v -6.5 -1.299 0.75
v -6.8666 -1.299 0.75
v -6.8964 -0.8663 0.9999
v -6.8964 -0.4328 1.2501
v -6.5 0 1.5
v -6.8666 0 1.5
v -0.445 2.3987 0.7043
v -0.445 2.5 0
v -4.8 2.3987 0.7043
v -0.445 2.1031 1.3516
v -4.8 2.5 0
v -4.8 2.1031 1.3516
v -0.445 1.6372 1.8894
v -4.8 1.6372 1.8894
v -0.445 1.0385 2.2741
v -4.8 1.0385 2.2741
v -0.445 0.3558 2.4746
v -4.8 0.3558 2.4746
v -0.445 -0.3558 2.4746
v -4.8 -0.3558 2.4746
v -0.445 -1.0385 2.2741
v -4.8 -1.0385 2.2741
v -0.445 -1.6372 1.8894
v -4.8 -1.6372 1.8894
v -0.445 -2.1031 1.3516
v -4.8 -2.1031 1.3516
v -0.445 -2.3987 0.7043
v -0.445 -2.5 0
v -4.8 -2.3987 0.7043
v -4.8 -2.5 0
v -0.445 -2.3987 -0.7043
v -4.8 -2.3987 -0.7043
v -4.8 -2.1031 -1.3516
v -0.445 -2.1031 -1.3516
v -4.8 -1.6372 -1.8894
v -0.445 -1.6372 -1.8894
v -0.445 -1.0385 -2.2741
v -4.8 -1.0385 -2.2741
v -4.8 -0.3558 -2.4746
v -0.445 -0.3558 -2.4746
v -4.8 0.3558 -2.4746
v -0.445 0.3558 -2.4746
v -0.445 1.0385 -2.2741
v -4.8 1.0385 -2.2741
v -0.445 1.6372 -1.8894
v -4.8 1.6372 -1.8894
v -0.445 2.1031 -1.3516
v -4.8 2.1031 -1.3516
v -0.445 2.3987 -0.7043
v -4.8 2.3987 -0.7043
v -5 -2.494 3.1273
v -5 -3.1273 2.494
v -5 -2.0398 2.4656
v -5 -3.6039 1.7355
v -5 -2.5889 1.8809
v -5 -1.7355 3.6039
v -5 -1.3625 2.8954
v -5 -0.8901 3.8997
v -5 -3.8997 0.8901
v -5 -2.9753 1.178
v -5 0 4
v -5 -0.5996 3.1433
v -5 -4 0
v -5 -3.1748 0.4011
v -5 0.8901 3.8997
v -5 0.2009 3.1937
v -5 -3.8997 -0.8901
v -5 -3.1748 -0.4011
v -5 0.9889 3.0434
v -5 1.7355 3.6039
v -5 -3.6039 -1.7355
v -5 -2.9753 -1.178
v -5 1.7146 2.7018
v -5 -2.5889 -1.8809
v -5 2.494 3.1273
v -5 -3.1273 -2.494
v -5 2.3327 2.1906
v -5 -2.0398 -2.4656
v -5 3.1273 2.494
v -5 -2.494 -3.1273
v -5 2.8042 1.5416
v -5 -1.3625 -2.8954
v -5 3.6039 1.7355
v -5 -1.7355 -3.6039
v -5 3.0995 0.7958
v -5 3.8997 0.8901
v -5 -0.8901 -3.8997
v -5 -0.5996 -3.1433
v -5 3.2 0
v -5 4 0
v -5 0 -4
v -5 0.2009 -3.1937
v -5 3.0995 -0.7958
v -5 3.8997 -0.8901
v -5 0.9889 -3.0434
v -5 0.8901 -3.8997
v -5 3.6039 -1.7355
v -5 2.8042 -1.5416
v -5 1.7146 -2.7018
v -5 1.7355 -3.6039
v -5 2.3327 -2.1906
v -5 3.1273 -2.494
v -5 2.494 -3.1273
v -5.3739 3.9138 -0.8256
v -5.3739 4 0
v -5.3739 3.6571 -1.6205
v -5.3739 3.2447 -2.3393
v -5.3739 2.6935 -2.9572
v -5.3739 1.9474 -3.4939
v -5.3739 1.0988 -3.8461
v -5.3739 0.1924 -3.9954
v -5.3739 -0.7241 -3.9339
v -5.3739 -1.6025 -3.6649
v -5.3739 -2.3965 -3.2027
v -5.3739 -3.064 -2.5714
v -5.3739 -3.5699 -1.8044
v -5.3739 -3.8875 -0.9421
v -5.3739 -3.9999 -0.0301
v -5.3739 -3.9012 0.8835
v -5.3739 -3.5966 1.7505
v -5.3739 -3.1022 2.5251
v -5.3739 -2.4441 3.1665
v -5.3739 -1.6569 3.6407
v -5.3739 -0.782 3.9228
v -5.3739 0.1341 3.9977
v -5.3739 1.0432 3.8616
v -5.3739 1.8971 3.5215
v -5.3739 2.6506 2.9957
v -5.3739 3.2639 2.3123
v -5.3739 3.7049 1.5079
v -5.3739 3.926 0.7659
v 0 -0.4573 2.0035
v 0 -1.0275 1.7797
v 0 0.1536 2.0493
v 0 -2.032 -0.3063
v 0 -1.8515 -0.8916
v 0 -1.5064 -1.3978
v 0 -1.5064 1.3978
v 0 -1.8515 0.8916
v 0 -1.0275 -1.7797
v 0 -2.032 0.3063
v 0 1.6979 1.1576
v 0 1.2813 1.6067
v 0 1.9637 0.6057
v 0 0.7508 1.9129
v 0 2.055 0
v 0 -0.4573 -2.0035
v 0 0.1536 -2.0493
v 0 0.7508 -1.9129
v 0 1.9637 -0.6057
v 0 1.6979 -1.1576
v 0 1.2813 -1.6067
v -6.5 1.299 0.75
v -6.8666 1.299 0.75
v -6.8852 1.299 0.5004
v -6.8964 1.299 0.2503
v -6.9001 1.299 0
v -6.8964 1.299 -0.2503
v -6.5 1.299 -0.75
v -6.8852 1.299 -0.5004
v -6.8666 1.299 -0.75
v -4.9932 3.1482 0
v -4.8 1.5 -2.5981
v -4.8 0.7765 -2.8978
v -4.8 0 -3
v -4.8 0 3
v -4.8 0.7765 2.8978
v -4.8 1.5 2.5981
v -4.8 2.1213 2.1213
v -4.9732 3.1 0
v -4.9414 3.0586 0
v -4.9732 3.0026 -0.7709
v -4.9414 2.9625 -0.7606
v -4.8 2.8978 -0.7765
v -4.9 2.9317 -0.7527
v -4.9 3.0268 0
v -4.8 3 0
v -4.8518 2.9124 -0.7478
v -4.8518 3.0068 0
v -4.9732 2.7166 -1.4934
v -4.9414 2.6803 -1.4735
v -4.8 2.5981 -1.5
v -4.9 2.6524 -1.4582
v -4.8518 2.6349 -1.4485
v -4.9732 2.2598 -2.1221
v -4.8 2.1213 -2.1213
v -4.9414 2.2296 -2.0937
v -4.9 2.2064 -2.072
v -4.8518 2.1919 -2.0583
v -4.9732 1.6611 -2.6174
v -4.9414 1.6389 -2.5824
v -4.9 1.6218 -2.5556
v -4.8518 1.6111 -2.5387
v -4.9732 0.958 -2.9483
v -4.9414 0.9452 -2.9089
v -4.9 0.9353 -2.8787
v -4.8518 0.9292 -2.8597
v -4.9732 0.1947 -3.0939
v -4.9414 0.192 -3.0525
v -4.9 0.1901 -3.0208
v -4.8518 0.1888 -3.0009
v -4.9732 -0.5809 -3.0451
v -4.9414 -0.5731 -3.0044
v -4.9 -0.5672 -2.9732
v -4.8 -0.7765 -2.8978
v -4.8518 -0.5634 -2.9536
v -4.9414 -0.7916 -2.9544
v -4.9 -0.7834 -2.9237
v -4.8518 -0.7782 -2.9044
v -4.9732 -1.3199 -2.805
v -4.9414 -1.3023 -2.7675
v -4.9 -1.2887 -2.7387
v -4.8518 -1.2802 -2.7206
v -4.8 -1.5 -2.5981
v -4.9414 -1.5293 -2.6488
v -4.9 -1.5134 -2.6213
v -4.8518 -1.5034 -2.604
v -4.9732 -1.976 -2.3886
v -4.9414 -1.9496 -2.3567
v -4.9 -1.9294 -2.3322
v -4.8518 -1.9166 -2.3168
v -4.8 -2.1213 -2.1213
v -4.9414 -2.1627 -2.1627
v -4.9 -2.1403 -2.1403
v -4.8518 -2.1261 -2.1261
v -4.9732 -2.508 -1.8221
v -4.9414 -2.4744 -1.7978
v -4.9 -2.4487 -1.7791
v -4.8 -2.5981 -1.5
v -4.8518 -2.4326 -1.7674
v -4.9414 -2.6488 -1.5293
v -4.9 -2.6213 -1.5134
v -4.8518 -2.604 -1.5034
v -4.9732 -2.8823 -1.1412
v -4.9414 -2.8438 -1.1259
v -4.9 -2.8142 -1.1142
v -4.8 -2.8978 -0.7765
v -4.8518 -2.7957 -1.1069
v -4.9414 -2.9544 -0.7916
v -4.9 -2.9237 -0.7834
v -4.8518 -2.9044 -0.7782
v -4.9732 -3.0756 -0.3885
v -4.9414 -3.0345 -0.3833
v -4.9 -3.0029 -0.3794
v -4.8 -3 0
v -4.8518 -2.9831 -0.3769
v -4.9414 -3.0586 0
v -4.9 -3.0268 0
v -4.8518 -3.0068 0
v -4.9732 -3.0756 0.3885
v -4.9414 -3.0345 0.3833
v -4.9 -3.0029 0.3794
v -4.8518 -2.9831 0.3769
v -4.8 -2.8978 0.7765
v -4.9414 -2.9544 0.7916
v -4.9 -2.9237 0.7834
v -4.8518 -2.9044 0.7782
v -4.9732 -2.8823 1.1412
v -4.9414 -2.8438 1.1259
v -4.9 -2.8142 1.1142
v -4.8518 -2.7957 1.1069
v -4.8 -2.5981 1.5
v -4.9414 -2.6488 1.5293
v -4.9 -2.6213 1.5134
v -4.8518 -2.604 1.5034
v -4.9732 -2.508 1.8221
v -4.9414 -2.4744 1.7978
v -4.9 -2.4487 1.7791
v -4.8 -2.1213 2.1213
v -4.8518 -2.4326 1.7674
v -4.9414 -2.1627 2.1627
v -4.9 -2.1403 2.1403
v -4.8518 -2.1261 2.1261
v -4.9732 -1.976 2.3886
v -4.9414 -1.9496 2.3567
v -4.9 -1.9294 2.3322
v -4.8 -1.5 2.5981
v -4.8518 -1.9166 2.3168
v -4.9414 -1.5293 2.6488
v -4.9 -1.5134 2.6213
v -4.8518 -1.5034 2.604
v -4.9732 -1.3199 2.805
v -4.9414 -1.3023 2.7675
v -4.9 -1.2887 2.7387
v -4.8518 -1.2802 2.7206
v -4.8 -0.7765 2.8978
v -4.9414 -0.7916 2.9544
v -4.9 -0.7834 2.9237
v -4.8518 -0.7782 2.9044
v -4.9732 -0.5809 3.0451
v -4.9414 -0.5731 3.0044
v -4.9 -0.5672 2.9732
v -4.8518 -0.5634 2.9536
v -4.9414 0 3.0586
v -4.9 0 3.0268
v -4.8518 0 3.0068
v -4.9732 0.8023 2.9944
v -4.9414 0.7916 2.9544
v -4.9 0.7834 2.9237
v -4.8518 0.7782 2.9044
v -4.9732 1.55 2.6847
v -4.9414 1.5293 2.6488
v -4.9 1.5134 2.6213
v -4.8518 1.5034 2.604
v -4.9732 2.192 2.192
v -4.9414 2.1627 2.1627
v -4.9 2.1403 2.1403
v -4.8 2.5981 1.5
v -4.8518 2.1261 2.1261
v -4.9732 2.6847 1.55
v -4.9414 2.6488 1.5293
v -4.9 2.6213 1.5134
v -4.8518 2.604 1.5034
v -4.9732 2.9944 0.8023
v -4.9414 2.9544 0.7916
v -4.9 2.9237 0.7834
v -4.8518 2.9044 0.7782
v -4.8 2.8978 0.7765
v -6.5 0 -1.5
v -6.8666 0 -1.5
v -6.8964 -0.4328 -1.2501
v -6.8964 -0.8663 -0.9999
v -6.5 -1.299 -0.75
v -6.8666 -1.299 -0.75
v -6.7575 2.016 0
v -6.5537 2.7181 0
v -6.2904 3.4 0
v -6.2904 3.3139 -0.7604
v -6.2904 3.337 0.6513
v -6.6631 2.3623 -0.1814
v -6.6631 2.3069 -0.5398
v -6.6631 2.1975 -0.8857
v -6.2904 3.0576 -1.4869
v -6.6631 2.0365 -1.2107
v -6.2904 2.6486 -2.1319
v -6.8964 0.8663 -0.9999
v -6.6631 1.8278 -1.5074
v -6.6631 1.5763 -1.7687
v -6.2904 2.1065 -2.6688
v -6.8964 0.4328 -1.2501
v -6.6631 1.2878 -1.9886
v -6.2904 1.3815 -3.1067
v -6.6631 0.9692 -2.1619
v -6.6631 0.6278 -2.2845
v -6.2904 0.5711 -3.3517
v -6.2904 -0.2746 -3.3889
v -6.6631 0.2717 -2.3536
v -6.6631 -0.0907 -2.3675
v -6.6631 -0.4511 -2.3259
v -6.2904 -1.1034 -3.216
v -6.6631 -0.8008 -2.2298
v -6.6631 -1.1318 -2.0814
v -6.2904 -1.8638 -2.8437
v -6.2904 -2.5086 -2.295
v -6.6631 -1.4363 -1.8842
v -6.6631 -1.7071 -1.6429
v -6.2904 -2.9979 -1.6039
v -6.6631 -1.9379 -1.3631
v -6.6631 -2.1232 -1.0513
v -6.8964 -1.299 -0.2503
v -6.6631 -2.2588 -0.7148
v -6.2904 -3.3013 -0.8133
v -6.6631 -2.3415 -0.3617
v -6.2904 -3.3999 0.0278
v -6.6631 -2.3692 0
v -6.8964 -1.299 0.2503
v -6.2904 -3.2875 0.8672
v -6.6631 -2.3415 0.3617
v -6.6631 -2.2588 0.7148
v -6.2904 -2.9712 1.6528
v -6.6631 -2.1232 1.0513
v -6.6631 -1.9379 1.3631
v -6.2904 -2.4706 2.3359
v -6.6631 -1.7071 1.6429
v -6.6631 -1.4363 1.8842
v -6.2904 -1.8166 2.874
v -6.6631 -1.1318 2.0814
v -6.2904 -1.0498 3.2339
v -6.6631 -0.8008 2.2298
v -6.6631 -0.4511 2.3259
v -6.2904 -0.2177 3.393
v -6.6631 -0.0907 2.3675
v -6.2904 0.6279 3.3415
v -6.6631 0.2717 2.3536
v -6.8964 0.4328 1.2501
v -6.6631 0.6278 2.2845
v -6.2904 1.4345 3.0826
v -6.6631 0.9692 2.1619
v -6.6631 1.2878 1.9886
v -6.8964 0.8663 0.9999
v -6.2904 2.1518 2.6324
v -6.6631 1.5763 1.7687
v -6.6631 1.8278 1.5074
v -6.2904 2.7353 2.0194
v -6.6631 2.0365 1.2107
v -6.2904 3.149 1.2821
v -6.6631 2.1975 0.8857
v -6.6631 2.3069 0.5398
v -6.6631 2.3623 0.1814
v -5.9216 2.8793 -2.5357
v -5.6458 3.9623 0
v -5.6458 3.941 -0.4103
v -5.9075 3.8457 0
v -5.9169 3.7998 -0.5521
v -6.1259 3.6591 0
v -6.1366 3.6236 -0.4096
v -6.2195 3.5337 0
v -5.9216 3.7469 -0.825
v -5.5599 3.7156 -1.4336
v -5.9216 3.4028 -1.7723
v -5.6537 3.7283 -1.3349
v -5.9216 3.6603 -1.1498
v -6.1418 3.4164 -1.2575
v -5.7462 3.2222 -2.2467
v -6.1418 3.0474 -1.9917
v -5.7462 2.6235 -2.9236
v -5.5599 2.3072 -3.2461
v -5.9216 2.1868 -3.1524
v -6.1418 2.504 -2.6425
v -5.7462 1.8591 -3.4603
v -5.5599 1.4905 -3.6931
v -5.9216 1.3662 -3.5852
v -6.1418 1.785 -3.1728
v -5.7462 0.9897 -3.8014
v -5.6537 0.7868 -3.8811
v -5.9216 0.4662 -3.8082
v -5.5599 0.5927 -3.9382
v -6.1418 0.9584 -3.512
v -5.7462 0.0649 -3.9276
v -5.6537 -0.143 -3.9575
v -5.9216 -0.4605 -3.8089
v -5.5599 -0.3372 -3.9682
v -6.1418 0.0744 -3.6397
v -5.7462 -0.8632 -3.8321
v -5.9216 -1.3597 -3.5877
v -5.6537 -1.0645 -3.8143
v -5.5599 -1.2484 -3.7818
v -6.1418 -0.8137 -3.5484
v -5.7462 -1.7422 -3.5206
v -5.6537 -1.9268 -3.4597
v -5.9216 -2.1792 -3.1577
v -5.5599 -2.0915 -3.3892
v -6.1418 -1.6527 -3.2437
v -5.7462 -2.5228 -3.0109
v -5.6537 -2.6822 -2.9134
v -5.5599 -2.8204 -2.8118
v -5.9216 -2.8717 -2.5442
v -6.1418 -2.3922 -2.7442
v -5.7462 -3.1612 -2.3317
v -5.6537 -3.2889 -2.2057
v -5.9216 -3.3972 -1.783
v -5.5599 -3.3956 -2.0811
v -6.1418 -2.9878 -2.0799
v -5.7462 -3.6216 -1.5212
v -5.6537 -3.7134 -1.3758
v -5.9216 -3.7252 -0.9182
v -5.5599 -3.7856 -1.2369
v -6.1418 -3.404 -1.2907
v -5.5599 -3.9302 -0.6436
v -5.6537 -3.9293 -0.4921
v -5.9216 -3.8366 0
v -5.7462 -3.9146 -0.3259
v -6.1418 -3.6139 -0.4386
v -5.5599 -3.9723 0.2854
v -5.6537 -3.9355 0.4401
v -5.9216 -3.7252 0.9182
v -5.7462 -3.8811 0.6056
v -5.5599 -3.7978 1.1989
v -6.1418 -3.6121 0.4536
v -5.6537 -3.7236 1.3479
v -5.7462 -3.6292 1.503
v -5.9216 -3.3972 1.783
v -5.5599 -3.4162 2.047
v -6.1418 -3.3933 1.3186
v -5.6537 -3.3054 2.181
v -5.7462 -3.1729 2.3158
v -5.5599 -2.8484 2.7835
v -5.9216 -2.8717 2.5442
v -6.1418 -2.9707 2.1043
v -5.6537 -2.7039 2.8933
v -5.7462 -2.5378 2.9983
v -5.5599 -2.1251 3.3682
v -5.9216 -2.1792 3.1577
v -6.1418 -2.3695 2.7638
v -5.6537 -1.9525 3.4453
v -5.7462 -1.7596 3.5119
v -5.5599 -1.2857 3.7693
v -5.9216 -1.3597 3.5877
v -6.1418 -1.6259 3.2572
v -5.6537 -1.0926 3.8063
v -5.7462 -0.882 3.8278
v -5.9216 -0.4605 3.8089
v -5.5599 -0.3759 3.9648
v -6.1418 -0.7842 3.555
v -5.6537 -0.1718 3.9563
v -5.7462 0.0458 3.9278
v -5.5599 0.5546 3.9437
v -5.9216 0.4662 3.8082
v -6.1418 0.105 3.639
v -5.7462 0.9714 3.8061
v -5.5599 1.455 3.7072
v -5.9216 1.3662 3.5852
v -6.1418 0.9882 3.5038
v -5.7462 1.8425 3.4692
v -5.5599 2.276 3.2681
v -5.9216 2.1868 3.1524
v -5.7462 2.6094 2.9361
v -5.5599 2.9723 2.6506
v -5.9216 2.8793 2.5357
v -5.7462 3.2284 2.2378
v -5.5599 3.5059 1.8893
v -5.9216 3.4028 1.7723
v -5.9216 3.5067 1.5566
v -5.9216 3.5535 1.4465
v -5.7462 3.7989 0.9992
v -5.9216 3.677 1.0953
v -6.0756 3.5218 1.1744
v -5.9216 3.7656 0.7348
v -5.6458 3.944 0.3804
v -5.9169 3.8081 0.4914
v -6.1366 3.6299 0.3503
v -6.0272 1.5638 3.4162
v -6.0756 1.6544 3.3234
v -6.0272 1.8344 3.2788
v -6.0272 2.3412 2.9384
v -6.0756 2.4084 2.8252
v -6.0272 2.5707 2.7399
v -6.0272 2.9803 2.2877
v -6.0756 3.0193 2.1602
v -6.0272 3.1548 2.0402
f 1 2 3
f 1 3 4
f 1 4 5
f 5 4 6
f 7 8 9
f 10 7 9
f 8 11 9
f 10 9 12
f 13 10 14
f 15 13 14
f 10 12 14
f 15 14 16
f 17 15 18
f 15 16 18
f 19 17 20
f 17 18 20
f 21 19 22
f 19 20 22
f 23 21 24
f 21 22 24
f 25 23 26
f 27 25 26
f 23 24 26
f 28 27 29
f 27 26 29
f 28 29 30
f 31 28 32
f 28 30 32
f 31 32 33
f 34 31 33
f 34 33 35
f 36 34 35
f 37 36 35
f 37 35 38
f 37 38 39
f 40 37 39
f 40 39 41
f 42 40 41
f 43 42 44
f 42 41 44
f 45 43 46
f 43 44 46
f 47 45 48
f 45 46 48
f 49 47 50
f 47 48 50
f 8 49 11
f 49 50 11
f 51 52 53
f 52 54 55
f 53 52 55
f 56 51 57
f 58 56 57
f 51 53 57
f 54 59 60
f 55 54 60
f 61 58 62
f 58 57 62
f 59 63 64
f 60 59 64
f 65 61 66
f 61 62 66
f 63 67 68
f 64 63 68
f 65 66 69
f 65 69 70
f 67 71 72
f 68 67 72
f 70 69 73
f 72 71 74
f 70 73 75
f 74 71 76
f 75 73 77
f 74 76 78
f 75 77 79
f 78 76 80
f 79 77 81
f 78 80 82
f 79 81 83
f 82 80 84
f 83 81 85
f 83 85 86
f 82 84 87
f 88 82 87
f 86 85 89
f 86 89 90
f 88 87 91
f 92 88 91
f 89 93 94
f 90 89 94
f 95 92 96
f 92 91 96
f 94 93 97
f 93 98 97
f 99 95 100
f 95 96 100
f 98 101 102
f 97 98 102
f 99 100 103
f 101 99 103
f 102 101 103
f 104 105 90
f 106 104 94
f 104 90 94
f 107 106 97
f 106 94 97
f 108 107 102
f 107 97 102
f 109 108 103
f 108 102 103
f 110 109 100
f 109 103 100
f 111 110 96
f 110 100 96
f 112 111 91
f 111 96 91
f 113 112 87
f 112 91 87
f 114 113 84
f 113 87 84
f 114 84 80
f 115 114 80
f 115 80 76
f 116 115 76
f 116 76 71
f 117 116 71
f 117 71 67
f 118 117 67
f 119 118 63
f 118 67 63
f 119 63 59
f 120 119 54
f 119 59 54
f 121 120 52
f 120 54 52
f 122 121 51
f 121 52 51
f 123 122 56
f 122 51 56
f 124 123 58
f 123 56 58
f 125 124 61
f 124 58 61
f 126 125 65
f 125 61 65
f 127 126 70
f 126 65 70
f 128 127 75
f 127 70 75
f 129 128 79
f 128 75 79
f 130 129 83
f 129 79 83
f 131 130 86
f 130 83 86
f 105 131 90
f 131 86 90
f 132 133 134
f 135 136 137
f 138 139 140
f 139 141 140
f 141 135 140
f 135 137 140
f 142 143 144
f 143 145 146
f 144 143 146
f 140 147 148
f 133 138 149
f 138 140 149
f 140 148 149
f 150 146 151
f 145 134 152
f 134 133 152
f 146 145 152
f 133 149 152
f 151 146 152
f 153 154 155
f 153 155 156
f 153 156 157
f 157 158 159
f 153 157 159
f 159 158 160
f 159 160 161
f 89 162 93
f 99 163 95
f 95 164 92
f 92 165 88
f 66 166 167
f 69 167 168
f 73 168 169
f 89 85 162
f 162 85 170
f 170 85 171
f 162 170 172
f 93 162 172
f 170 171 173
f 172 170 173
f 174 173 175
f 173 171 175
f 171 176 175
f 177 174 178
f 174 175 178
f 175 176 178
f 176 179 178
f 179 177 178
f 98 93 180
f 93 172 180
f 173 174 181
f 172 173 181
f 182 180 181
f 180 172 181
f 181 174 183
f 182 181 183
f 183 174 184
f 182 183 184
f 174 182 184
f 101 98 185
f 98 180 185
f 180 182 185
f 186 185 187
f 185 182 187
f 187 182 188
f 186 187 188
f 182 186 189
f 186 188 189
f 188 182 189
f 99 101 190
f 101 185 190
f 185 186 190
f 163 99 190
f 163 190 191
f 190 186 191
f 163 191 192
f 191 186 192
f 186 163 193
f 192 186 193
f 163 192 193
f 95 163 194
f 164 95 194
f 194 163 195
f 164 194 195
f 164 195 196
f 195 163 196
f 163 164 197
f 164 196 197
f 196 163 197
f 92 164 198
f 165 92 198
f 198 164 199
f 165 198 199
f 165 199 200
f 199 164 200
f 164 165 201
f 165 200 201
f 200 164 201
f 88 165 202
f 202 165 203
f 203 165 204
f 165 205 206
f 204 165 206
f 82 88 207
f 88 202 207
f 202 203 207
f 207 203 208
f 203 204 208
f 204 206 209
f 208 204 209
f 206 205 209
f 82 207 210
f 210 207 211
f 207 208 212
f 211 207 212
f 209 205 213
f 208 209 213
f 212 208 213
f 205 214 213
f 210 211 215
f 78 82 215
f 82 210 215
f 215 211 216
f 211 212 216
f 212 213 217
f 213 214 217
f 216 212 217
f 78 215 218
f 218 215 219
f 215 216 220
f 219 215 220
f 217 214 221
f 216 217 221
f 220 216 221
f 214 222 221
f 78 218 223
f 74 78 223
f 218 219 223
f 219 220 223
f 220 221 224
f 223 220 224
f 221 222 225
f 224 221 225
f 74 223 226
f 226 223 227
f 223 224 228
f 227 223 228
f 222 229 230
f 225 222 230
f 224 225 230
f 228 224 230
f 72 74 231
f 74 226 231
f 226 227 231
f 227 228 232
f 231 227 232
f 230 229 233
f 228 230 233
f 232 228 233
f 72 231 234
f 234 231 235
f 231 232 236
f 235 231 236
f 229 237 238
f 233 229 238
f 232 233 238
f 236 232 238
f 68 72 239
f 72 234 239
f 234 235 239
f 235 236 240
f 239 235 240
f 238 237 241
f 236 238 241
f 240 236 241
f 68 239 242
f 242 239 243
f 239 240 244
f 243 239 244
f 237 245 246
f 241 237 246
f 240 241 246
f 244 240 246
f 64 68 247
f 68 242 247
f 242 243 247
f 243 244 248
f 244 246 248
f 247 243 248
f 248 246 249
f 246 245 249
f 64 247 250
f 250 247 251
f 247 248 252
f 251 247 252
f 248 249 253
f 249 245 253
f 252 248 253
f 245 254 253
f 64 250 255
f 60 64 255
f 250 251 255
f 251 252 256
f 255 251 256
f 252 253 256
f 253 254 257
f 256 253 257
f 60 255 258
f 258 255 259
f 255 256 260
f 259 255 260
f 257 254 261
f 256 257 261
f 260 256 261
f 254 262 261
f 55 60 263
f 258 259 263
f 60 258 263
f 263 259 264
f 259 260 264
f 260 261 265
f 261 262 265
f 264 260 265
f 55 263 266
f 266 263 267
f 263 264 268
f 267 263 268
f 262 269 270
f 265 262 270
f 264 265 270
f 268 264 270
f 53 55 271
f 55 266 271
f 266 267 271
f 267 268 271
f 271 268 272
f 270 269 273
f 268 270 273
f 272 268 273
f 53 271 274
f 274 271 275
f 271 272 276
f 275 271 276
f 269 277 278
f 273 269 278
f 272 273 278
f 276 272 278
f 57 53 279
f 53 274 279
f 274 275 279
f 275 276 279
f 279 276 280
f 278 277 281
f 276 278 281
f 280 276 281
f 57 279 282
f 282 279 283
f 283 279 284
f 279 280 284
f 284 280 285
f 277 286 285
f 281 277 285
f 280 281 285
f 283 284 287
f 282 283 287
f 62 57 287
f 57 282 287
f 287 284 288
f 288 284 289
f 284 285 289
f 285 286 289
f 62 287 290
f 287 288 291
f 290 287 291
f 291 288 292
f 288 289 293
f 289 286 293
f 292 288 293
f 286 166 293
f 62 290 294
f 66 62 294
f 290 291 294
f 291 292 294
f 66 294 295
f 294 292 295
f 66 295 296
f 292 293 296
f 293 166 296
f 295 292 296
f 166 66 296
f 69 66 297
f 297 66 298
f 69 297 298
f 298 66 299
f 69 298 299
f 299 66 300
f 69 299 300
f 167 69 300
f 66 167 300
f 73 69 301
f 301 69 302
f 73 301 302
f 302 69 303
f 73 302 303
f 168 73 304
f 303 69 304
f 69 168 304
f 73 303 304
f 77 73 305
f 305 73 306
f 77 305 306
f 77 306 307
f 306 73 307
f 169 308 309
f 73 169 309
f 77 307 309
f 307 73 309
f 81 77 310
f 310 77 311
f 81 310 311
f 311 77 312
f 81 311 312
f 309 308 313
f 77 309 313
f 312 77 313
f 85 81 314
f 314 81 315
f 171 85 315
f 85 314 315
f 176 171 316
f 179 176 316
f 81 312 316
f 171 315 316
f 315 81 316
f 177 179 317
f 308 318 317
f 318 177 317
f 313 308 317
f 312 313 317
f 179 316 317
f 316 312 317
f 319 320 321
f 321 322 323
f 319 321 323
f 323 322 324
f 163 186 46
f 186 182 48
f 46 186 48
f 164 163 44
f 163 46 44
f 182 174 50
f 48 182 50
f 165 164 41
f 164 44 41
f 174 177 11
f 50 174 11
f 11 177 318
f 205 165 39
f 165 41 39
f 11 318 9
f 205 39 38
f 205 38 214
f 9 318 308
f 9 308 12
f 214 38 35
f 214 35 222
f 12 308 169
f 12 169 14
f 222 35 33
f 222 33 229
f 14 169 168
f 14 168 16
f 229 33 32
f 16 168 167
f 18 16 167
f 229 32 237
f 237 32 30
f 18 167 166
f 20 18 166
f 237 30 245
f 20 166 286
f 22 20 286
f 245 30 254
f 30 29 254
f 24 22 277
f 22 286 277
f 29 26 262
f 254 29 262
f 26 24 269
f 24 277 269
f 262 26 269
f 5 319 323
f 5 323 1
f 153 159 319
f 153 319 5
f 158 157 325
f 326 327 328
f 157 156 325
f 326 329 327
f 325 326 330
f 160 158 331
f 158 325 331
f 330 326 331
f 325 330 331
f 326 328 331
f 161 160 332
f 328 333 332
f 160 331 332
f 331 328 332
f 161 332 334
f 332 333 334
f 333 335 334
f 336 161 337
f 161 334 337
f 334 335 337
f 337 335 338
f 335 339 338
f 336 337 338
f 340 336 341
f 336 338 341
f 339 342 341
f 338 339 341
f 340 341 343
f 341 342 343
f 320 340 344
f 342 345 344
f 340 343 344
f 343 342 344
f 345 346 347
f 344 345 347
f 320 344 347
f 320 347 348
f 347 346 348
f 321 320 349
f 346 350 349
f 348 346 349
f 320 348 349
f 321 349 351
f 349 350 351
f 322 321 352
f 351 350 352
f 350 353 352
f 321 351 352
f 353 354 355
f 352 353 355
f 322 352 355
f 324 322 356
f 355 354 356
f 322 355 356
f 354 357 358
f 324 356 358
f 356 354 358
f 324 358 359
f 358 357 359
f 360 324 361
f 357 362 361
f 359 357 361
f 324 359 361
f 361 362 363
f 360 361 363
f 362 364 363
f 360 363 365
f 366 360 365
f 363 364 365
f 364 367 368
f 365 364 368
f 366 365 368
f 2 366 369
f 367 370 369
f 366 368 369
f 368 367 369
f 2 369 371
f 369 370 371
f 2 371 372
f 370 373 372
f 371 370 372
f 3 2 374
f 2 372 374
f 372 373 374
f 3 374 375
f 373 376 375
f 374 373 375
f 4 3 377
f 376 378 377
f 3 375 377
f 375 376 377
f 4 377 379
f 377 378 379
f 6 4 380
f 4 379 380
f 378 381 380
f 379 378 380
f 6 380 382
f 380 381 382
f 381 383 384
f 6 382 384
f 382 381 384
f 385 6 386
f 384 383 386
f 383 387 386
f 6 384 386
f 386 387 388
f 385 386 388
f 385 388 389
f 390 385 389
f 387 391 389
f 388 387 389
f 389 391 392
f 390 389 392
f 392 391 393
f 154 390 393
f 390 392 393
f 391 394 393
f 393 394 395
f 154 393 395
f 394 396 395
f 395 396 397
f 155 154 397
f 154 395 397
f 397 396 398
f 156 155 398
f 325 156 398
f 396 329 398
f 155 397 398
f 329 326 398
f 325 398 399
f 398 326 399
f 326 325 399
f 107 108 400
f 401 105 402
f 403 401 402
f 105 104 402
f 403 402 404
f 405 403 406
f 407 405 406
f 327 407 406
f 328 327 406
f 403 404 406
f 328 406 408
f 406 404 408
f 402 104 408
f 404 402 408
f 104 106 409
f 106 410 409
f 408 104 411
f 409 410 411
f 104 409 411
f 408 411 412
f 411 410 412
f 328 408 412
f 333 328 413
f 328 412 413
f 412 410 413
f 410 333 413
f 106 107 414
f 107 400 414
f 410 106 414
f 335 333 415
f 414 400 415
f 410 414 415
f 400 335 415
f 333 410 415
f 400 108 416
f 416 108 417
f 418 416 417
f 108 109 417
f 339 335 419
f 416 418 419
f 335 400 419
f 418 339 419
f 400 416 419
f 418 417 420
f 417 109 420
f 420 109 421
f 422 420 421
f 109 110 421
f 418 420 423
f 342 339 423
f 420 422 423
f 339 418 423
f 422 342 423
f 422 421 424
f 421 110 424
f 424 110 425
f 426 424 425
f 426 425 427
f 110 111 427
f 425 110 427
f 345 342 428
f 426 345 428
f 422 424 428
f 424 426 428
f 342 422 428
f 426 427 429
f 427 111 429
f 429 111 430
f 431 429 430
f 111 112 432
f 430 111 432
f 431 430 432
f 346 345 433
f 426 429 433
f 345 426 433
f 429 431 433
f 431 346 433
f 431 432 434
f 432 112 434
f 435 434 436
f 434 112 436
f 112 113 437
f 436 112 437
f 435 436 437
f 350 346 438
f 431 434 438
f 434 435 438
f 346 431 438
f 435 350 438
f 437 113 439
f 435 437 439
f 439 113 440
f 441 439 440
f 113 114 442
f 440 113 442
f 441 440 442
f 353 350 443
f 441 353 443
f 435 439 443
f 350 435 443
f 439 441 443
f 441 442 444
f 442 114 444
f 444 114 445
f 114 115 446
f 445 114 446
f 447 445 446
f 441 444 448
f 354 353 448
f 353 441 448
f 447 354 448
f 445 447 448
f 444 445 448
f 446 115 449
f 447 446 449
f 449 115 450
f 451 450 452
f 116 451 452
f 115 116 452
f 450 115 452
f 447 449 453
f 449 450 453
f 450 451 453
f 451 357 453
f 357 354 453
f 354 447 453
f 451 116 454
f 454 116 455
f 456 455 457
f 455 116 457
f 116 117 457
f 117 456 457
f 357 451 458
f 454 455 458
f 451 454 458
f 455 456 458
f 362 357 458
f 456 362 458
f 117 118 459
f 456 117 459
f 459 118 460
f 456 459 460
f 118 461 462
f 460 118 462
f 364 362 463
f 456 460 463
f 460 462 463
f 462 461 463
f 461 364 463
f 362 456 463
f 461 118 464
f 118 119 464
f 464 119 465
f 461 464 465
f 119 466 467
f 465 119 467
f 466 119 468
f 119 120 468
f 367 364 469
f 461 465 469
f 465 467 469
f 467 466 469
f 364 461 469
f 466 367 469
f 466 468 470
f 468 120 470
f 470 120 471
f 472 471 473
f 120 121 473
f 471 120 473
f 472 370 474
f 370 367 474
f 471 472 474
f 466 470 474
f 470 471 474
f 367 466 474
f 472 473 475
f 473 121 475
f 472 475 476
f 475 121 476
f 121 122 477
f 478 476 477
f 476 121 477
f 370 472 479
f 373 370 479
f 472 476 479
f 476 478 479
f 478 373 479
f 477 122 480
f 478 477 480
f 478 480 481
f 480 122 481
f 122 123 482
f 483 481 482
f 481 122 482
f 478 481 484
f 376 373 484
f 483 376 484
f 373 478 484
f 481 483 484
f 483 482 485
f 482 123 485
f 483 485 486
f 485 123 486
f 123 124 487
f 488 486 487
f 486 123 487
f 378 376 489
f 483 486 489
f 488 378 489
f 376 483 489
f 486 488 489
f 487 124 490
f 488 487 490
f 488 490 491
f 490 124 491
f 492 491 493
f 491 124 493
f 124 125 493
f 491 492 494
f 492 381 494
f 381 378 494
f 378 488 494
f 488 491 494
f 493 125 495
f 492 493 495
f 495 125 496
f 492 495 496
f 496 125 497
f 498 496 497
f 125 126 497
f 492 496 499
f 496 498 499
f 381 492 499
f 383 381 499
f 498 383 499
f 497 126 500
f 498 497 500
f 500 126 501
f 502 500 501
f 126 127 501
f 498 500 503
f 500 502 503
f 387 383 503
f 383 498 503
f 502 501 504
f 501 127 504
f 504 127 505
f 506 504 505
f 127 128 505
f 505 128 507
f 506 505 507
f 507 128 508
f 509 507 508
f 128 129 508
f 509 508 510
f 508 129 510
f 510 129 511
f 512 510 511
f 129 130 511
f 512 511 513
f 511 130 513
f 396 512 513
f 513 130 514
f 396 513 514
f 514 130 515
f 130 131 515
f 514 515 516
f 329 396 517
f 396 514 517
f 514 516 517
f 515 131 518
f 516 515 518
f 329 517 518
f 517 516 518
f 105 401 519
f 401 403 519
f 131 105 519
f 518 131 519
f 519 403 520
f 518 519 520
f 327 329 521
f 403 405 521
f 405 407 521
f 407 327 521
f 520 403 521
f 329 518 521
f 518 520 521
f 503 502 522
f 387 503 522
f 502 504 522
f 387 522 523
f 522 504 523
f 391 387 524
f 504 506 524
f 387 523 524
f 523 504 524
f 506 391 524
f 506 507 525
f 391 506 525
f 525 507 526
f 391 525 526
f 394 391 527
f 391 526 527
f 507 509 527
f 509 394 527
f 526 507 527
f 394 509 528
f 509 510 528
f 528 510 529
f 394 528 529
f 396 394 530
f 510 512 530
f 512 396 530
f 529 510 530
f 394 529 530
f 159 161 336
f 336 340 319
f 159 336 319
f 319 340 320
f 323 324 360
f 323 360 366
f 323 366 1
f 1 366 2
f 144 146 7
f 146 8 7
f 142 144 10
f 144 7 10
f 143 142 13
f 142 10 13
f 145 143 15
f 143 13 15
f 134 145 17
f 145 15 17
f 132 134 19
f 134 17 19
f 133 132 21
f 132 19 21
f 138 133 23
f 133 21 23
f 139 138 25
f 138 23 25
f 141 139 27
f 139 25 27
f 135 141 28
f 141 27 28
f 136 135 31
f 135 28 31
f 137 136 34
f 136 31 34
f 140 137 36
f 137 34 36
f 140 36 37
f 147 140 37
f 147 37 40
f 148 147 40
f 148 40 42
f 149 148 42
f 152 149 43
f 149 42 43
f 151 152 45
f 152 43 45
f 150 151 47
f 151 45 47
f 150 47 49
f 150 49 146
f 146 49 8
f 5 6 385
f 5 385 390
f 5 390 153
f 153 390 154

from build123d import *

# Parameters (mm, degrees)
ENL_V_MAT_EXTRU_1_DEPTH = 0.5
CONG_1_R                = 0.2
CONG_2_R                = 1


# Read off the part's stored shape, not the designer's step: M5 Filetages mécaniques Borne1
with BuildPart() as part:
    # Esquisse1 → Révolution1 (revolve)
    with BuildSketch(Plane.XY):
        with BuildLine():
            Line((0, 0), (-7, 0))
            ThreePointArc((-7, 0), (-6.746211251, 2.061552813), (-6, 4))
            Line((-6, 4), (-5, 4))
            Line((-5, 4), (-5, 3))
            Line((-5, 3), (0, 3))
            Line((0, 3), (0, 0))
        make_face()
    revolve(axis=Axis((0, 0, 0), (-1, 0, 0)))

    # Esquisse2 → Enlèv. mat.-Extru.1 (cut)
    with BuildSketch(Plane.ZY.offset(7)):
        Polygon((0.75, 1.299038106), (-0.75, 1.299038106), (-1.5, 0), (-0.75, -1.299038106), (0.75, -1.299038106), (1.5, 0), align=None)
    extrude(amount=-ENL_V_MAT_EXTRU_1_DEPTH, mode=Mode.SUBTRACT)

    # Congé1
    cong_1_edges = [part.edges().sort_by_distance(p)[0] for p in [
        (-5, -3, 0),
    ]]
    fillet(cong_1_edges, radius=CONG_1_R)

    # Congé2
    cong_2_edges = [part.edges().sort_by_distance(p)[0] for p in [
        (-6, -4, 0),
    ]]
    fillet(cong_2_edges, radius=CONG_2_R)

    # M5 Filetages mécaniques Borne1 outline → M5 Filetages mécaniques Borne1 (revolve, cut)
    with BuildSketch(Plane.YX):
        Polygon((3, 0), (2.055, 0), (2.5, -0.445), (2.5, -4.8), (3, -4.8), align=None)
    revolve(axis=Axis((0, 0, 0), (1, 0, 0)), mode=Mode.SUBTRACT)


solid = part.part
